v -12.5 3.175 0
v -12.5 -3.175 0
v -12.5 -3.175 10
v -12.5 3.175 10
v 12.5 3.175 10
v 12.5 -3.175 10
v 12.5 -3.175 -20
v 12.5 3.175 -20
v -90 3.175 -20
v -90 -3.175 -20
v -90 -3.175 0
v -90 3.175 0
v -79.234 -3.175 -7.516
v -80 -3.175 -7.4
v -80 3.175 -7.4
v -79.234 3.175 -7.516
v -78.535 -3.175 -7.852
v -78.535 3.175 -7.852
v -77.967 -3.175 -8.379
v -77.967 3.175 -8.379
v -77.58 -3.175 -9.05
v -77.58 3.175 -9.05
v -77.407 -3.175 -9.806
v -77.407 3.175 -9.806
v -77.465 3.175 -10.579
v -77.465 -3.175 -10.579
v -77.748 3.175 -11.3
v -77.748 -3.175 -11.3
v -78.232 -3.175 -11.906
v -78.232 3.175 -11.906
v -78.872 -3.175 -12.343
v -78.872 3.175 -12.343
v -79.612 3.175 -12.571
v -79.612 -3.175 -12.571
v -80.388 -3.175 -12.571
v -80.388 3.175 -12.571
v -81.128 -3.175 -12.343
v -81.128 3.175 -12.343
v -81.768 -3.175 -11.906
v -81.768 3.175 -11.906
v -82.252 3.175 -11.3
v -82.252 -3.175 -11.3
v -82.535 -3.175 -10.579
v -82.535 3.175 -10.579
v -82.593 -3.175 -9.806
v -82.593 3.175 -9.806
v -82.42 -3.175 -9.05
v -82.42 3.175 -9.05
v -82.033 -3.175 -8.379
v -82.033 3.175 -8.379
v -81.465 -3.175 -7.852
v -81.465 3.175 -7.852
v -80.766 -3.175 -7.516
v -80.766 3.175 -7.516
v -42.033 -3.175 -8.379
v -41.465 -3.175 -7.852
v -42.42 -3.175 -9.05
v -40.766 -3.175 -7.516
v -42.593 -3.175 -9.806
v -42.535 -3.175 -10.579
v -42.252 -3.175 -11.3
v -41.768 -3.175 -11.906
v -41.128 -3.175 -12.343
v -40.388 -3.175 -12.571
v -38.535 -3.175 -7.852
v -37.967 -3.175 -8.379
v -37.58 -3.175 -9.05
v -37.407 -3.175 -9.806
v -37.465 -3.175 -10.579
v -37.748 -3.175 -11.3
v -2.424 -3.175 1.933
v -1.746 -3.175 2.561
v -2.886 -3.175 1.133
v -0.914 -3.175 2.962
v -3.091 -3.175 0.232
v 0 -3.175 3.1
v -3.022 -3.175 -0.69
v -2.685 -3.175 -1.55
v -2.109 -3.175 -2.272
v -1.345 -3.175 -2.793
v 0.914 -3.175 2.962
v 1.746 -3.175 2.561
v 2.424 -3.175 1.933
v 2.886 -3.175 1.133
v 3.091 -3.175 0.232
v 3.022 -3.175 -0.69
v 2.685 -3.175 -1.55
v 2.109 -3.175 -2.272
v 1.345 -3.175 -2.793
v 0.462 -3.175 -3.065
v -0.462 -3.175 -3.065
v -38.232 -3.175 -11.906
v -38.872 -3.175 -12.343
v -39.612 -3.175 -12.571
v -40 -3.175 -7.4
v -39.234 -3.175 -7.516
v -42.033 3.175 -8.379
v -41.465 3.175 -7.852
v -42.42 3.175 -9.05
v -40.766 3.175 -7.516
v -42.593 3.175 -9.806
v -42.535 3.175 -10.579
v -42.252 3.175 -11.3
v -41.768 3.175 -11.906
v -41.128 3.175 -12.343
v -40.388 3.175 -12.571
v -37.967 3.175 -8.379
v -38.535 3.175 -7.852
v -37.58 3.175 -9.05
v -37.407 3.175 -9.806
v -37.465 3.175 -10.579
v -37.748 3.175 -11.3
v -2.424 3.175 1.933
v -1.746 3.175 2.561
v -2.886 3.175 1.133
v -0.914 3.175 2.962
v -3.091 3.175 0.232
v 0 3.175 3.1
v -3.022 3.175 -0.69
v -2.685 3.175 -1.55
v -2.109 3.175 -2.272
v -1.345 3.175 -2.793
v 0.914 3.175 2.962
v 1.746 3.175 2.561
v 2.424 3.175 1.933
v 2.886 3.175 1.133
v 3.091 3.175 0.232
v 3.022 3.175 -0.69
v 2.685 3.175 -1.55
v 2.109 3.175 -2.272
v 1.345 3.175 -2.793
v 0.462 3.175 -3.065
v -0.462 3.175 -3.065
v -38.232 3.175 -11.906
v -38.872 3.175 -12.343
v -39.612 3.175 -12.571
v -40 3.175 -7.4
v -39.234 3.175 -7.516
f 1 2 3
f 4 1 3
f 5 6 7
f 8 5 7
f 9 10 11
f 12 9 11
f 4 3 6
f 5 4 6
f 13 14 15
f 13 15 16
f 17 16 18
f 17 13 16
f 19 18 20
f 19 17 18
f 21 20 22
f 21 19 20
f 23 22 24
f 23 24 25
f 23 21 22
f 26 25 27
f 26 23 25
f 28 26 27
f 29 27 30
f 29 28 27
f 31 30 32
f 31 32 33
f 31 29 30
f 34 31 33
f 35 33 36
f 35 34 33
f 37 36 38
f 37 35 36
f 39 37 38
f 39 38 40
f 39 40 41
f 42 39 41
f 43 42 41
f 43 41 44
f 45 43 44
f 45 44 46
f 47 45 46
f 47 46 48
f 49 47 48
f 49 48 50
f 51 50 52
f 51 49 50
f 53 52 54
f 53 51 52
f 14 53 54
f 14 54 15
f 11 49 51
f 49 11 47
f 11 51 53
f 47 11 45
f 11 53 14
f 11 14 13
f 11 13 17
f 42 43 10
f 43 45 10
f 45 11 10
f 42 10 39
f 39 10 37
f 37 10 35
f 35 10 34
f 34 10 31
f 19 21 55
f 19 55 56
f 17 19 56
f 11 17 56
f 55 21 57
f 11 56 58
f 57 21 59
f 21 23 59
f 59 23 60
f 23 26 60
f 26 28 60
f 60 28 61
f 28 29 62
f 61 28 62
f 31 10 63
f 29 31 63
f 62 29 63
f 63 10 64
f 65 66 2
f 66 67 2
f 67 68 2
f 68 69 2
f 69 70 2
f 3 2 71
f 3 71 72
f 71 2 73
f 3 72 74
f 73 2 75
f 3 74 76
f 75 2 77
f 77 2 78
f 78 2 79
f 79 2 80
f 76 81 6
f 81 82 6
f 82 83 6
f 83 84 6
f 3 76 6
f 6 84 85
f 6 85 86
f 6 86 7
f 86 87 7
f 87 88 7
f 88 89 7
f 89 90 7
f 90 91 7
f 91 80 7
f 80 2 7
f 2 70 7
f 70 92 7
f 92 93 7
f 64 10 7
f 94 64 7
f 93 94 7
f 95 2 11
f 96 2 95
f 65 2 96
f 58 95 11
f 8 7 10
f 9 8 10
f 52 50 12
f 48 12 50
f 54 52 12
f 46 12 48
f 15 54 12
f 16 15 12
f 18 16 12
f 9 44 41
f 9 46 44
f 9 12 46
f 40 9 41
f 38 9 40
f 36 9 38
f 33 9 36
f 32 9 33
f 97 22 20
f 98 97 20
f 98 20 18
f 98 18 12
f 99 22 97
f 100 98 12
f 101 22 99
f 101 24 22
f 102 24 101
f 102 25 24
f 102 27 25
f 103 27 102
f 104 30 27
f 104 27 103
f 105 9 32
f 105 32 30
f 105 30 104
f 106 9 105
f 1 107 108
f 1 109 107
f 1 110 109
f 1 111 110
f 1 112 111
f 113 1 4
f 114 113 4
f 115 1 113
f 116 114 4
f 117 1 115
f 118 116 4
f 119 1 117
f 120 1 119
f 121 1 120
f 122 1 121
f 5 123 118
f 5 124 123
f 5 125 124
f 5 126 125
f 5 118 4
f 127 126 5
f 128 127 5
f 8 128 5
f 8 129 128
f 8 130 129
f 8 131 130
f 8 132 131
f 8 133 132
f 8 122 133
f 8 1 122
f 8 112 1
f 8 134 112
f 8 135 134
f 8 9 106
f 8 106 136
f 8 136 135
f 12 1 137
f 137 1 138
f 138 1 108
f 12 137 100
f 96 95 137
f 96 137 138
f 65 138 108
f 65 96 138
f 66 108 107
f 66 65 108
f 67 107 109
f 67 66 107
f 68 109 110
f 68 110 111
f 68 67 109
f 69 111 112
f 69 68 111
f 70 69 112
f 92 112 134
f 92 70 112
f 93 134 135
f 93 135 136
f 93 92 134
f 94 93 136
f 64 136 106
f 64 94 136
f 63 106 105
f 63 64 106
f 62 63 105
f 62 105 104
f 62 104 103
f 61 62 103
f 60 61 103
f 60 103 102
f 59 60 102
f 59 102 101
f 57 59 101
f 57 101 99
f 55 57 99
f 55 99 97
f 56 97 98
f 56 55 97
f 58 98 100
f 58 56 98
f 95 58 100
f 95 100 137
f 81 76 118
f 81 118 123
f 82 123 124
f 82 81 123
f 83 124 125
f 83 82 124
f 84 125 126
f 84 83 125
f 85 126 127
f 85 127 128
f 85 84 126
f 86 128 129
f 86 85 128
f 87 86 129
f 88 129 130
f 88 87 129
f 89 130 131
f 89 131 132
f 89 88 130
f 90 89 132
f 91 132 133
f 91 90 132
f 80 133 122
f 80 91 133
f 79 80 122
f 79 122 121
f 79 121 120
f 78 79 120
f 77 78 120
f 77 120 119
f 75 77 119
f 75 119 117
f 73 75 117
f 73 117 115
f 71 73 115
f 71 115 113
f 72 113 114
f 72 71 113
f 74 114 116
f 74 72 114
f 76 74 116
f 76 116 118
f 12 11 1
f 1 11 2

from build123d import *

# Parameters (mm, degrees)
BOSS_EXTRUDE1_DEPTH      = 3.175
BOSS_EXTRUDE1_DEPTH_BACK = 3.175
SKETCH1_R                = 3.1
SKETCH1_R_2              = 2.6


with BuildPart() as part:
    # Sketch1 → Boss-Extrude1 (new, two sides: drawn at the far end of the back side and taken through both)
    with BuildSketch(Plane(origin=(0, 0, 0), x_dir=(1, 0, 0), z_dir=(0, 1, 0)).offset(-BOSS_EXTRUDE1_DEPTH_BACK)):
        Polygon((-12.5, 0), (-12.5, -10), (12.5, -10), (12.5, 0), (12.5, 20), (-90, 20), (-90, 0), align=None)
        Circle(SKETCH1_R, mode=Mode.SUBTRACT)
        with Locations((-40, 10)):
            Circle(SKETCH1_R_2, mode=Mode.SUBTRACT)
        with Locations((-80, 10)):
            Circle(SKETCH1_R_2, mode=Mode.SUBTRACT)
    extrude(amount=BOSS_EXTRUDE1_DEPTH + BOSS_EXTRUDE1_DEPTH_BACK)


solid = part.part
